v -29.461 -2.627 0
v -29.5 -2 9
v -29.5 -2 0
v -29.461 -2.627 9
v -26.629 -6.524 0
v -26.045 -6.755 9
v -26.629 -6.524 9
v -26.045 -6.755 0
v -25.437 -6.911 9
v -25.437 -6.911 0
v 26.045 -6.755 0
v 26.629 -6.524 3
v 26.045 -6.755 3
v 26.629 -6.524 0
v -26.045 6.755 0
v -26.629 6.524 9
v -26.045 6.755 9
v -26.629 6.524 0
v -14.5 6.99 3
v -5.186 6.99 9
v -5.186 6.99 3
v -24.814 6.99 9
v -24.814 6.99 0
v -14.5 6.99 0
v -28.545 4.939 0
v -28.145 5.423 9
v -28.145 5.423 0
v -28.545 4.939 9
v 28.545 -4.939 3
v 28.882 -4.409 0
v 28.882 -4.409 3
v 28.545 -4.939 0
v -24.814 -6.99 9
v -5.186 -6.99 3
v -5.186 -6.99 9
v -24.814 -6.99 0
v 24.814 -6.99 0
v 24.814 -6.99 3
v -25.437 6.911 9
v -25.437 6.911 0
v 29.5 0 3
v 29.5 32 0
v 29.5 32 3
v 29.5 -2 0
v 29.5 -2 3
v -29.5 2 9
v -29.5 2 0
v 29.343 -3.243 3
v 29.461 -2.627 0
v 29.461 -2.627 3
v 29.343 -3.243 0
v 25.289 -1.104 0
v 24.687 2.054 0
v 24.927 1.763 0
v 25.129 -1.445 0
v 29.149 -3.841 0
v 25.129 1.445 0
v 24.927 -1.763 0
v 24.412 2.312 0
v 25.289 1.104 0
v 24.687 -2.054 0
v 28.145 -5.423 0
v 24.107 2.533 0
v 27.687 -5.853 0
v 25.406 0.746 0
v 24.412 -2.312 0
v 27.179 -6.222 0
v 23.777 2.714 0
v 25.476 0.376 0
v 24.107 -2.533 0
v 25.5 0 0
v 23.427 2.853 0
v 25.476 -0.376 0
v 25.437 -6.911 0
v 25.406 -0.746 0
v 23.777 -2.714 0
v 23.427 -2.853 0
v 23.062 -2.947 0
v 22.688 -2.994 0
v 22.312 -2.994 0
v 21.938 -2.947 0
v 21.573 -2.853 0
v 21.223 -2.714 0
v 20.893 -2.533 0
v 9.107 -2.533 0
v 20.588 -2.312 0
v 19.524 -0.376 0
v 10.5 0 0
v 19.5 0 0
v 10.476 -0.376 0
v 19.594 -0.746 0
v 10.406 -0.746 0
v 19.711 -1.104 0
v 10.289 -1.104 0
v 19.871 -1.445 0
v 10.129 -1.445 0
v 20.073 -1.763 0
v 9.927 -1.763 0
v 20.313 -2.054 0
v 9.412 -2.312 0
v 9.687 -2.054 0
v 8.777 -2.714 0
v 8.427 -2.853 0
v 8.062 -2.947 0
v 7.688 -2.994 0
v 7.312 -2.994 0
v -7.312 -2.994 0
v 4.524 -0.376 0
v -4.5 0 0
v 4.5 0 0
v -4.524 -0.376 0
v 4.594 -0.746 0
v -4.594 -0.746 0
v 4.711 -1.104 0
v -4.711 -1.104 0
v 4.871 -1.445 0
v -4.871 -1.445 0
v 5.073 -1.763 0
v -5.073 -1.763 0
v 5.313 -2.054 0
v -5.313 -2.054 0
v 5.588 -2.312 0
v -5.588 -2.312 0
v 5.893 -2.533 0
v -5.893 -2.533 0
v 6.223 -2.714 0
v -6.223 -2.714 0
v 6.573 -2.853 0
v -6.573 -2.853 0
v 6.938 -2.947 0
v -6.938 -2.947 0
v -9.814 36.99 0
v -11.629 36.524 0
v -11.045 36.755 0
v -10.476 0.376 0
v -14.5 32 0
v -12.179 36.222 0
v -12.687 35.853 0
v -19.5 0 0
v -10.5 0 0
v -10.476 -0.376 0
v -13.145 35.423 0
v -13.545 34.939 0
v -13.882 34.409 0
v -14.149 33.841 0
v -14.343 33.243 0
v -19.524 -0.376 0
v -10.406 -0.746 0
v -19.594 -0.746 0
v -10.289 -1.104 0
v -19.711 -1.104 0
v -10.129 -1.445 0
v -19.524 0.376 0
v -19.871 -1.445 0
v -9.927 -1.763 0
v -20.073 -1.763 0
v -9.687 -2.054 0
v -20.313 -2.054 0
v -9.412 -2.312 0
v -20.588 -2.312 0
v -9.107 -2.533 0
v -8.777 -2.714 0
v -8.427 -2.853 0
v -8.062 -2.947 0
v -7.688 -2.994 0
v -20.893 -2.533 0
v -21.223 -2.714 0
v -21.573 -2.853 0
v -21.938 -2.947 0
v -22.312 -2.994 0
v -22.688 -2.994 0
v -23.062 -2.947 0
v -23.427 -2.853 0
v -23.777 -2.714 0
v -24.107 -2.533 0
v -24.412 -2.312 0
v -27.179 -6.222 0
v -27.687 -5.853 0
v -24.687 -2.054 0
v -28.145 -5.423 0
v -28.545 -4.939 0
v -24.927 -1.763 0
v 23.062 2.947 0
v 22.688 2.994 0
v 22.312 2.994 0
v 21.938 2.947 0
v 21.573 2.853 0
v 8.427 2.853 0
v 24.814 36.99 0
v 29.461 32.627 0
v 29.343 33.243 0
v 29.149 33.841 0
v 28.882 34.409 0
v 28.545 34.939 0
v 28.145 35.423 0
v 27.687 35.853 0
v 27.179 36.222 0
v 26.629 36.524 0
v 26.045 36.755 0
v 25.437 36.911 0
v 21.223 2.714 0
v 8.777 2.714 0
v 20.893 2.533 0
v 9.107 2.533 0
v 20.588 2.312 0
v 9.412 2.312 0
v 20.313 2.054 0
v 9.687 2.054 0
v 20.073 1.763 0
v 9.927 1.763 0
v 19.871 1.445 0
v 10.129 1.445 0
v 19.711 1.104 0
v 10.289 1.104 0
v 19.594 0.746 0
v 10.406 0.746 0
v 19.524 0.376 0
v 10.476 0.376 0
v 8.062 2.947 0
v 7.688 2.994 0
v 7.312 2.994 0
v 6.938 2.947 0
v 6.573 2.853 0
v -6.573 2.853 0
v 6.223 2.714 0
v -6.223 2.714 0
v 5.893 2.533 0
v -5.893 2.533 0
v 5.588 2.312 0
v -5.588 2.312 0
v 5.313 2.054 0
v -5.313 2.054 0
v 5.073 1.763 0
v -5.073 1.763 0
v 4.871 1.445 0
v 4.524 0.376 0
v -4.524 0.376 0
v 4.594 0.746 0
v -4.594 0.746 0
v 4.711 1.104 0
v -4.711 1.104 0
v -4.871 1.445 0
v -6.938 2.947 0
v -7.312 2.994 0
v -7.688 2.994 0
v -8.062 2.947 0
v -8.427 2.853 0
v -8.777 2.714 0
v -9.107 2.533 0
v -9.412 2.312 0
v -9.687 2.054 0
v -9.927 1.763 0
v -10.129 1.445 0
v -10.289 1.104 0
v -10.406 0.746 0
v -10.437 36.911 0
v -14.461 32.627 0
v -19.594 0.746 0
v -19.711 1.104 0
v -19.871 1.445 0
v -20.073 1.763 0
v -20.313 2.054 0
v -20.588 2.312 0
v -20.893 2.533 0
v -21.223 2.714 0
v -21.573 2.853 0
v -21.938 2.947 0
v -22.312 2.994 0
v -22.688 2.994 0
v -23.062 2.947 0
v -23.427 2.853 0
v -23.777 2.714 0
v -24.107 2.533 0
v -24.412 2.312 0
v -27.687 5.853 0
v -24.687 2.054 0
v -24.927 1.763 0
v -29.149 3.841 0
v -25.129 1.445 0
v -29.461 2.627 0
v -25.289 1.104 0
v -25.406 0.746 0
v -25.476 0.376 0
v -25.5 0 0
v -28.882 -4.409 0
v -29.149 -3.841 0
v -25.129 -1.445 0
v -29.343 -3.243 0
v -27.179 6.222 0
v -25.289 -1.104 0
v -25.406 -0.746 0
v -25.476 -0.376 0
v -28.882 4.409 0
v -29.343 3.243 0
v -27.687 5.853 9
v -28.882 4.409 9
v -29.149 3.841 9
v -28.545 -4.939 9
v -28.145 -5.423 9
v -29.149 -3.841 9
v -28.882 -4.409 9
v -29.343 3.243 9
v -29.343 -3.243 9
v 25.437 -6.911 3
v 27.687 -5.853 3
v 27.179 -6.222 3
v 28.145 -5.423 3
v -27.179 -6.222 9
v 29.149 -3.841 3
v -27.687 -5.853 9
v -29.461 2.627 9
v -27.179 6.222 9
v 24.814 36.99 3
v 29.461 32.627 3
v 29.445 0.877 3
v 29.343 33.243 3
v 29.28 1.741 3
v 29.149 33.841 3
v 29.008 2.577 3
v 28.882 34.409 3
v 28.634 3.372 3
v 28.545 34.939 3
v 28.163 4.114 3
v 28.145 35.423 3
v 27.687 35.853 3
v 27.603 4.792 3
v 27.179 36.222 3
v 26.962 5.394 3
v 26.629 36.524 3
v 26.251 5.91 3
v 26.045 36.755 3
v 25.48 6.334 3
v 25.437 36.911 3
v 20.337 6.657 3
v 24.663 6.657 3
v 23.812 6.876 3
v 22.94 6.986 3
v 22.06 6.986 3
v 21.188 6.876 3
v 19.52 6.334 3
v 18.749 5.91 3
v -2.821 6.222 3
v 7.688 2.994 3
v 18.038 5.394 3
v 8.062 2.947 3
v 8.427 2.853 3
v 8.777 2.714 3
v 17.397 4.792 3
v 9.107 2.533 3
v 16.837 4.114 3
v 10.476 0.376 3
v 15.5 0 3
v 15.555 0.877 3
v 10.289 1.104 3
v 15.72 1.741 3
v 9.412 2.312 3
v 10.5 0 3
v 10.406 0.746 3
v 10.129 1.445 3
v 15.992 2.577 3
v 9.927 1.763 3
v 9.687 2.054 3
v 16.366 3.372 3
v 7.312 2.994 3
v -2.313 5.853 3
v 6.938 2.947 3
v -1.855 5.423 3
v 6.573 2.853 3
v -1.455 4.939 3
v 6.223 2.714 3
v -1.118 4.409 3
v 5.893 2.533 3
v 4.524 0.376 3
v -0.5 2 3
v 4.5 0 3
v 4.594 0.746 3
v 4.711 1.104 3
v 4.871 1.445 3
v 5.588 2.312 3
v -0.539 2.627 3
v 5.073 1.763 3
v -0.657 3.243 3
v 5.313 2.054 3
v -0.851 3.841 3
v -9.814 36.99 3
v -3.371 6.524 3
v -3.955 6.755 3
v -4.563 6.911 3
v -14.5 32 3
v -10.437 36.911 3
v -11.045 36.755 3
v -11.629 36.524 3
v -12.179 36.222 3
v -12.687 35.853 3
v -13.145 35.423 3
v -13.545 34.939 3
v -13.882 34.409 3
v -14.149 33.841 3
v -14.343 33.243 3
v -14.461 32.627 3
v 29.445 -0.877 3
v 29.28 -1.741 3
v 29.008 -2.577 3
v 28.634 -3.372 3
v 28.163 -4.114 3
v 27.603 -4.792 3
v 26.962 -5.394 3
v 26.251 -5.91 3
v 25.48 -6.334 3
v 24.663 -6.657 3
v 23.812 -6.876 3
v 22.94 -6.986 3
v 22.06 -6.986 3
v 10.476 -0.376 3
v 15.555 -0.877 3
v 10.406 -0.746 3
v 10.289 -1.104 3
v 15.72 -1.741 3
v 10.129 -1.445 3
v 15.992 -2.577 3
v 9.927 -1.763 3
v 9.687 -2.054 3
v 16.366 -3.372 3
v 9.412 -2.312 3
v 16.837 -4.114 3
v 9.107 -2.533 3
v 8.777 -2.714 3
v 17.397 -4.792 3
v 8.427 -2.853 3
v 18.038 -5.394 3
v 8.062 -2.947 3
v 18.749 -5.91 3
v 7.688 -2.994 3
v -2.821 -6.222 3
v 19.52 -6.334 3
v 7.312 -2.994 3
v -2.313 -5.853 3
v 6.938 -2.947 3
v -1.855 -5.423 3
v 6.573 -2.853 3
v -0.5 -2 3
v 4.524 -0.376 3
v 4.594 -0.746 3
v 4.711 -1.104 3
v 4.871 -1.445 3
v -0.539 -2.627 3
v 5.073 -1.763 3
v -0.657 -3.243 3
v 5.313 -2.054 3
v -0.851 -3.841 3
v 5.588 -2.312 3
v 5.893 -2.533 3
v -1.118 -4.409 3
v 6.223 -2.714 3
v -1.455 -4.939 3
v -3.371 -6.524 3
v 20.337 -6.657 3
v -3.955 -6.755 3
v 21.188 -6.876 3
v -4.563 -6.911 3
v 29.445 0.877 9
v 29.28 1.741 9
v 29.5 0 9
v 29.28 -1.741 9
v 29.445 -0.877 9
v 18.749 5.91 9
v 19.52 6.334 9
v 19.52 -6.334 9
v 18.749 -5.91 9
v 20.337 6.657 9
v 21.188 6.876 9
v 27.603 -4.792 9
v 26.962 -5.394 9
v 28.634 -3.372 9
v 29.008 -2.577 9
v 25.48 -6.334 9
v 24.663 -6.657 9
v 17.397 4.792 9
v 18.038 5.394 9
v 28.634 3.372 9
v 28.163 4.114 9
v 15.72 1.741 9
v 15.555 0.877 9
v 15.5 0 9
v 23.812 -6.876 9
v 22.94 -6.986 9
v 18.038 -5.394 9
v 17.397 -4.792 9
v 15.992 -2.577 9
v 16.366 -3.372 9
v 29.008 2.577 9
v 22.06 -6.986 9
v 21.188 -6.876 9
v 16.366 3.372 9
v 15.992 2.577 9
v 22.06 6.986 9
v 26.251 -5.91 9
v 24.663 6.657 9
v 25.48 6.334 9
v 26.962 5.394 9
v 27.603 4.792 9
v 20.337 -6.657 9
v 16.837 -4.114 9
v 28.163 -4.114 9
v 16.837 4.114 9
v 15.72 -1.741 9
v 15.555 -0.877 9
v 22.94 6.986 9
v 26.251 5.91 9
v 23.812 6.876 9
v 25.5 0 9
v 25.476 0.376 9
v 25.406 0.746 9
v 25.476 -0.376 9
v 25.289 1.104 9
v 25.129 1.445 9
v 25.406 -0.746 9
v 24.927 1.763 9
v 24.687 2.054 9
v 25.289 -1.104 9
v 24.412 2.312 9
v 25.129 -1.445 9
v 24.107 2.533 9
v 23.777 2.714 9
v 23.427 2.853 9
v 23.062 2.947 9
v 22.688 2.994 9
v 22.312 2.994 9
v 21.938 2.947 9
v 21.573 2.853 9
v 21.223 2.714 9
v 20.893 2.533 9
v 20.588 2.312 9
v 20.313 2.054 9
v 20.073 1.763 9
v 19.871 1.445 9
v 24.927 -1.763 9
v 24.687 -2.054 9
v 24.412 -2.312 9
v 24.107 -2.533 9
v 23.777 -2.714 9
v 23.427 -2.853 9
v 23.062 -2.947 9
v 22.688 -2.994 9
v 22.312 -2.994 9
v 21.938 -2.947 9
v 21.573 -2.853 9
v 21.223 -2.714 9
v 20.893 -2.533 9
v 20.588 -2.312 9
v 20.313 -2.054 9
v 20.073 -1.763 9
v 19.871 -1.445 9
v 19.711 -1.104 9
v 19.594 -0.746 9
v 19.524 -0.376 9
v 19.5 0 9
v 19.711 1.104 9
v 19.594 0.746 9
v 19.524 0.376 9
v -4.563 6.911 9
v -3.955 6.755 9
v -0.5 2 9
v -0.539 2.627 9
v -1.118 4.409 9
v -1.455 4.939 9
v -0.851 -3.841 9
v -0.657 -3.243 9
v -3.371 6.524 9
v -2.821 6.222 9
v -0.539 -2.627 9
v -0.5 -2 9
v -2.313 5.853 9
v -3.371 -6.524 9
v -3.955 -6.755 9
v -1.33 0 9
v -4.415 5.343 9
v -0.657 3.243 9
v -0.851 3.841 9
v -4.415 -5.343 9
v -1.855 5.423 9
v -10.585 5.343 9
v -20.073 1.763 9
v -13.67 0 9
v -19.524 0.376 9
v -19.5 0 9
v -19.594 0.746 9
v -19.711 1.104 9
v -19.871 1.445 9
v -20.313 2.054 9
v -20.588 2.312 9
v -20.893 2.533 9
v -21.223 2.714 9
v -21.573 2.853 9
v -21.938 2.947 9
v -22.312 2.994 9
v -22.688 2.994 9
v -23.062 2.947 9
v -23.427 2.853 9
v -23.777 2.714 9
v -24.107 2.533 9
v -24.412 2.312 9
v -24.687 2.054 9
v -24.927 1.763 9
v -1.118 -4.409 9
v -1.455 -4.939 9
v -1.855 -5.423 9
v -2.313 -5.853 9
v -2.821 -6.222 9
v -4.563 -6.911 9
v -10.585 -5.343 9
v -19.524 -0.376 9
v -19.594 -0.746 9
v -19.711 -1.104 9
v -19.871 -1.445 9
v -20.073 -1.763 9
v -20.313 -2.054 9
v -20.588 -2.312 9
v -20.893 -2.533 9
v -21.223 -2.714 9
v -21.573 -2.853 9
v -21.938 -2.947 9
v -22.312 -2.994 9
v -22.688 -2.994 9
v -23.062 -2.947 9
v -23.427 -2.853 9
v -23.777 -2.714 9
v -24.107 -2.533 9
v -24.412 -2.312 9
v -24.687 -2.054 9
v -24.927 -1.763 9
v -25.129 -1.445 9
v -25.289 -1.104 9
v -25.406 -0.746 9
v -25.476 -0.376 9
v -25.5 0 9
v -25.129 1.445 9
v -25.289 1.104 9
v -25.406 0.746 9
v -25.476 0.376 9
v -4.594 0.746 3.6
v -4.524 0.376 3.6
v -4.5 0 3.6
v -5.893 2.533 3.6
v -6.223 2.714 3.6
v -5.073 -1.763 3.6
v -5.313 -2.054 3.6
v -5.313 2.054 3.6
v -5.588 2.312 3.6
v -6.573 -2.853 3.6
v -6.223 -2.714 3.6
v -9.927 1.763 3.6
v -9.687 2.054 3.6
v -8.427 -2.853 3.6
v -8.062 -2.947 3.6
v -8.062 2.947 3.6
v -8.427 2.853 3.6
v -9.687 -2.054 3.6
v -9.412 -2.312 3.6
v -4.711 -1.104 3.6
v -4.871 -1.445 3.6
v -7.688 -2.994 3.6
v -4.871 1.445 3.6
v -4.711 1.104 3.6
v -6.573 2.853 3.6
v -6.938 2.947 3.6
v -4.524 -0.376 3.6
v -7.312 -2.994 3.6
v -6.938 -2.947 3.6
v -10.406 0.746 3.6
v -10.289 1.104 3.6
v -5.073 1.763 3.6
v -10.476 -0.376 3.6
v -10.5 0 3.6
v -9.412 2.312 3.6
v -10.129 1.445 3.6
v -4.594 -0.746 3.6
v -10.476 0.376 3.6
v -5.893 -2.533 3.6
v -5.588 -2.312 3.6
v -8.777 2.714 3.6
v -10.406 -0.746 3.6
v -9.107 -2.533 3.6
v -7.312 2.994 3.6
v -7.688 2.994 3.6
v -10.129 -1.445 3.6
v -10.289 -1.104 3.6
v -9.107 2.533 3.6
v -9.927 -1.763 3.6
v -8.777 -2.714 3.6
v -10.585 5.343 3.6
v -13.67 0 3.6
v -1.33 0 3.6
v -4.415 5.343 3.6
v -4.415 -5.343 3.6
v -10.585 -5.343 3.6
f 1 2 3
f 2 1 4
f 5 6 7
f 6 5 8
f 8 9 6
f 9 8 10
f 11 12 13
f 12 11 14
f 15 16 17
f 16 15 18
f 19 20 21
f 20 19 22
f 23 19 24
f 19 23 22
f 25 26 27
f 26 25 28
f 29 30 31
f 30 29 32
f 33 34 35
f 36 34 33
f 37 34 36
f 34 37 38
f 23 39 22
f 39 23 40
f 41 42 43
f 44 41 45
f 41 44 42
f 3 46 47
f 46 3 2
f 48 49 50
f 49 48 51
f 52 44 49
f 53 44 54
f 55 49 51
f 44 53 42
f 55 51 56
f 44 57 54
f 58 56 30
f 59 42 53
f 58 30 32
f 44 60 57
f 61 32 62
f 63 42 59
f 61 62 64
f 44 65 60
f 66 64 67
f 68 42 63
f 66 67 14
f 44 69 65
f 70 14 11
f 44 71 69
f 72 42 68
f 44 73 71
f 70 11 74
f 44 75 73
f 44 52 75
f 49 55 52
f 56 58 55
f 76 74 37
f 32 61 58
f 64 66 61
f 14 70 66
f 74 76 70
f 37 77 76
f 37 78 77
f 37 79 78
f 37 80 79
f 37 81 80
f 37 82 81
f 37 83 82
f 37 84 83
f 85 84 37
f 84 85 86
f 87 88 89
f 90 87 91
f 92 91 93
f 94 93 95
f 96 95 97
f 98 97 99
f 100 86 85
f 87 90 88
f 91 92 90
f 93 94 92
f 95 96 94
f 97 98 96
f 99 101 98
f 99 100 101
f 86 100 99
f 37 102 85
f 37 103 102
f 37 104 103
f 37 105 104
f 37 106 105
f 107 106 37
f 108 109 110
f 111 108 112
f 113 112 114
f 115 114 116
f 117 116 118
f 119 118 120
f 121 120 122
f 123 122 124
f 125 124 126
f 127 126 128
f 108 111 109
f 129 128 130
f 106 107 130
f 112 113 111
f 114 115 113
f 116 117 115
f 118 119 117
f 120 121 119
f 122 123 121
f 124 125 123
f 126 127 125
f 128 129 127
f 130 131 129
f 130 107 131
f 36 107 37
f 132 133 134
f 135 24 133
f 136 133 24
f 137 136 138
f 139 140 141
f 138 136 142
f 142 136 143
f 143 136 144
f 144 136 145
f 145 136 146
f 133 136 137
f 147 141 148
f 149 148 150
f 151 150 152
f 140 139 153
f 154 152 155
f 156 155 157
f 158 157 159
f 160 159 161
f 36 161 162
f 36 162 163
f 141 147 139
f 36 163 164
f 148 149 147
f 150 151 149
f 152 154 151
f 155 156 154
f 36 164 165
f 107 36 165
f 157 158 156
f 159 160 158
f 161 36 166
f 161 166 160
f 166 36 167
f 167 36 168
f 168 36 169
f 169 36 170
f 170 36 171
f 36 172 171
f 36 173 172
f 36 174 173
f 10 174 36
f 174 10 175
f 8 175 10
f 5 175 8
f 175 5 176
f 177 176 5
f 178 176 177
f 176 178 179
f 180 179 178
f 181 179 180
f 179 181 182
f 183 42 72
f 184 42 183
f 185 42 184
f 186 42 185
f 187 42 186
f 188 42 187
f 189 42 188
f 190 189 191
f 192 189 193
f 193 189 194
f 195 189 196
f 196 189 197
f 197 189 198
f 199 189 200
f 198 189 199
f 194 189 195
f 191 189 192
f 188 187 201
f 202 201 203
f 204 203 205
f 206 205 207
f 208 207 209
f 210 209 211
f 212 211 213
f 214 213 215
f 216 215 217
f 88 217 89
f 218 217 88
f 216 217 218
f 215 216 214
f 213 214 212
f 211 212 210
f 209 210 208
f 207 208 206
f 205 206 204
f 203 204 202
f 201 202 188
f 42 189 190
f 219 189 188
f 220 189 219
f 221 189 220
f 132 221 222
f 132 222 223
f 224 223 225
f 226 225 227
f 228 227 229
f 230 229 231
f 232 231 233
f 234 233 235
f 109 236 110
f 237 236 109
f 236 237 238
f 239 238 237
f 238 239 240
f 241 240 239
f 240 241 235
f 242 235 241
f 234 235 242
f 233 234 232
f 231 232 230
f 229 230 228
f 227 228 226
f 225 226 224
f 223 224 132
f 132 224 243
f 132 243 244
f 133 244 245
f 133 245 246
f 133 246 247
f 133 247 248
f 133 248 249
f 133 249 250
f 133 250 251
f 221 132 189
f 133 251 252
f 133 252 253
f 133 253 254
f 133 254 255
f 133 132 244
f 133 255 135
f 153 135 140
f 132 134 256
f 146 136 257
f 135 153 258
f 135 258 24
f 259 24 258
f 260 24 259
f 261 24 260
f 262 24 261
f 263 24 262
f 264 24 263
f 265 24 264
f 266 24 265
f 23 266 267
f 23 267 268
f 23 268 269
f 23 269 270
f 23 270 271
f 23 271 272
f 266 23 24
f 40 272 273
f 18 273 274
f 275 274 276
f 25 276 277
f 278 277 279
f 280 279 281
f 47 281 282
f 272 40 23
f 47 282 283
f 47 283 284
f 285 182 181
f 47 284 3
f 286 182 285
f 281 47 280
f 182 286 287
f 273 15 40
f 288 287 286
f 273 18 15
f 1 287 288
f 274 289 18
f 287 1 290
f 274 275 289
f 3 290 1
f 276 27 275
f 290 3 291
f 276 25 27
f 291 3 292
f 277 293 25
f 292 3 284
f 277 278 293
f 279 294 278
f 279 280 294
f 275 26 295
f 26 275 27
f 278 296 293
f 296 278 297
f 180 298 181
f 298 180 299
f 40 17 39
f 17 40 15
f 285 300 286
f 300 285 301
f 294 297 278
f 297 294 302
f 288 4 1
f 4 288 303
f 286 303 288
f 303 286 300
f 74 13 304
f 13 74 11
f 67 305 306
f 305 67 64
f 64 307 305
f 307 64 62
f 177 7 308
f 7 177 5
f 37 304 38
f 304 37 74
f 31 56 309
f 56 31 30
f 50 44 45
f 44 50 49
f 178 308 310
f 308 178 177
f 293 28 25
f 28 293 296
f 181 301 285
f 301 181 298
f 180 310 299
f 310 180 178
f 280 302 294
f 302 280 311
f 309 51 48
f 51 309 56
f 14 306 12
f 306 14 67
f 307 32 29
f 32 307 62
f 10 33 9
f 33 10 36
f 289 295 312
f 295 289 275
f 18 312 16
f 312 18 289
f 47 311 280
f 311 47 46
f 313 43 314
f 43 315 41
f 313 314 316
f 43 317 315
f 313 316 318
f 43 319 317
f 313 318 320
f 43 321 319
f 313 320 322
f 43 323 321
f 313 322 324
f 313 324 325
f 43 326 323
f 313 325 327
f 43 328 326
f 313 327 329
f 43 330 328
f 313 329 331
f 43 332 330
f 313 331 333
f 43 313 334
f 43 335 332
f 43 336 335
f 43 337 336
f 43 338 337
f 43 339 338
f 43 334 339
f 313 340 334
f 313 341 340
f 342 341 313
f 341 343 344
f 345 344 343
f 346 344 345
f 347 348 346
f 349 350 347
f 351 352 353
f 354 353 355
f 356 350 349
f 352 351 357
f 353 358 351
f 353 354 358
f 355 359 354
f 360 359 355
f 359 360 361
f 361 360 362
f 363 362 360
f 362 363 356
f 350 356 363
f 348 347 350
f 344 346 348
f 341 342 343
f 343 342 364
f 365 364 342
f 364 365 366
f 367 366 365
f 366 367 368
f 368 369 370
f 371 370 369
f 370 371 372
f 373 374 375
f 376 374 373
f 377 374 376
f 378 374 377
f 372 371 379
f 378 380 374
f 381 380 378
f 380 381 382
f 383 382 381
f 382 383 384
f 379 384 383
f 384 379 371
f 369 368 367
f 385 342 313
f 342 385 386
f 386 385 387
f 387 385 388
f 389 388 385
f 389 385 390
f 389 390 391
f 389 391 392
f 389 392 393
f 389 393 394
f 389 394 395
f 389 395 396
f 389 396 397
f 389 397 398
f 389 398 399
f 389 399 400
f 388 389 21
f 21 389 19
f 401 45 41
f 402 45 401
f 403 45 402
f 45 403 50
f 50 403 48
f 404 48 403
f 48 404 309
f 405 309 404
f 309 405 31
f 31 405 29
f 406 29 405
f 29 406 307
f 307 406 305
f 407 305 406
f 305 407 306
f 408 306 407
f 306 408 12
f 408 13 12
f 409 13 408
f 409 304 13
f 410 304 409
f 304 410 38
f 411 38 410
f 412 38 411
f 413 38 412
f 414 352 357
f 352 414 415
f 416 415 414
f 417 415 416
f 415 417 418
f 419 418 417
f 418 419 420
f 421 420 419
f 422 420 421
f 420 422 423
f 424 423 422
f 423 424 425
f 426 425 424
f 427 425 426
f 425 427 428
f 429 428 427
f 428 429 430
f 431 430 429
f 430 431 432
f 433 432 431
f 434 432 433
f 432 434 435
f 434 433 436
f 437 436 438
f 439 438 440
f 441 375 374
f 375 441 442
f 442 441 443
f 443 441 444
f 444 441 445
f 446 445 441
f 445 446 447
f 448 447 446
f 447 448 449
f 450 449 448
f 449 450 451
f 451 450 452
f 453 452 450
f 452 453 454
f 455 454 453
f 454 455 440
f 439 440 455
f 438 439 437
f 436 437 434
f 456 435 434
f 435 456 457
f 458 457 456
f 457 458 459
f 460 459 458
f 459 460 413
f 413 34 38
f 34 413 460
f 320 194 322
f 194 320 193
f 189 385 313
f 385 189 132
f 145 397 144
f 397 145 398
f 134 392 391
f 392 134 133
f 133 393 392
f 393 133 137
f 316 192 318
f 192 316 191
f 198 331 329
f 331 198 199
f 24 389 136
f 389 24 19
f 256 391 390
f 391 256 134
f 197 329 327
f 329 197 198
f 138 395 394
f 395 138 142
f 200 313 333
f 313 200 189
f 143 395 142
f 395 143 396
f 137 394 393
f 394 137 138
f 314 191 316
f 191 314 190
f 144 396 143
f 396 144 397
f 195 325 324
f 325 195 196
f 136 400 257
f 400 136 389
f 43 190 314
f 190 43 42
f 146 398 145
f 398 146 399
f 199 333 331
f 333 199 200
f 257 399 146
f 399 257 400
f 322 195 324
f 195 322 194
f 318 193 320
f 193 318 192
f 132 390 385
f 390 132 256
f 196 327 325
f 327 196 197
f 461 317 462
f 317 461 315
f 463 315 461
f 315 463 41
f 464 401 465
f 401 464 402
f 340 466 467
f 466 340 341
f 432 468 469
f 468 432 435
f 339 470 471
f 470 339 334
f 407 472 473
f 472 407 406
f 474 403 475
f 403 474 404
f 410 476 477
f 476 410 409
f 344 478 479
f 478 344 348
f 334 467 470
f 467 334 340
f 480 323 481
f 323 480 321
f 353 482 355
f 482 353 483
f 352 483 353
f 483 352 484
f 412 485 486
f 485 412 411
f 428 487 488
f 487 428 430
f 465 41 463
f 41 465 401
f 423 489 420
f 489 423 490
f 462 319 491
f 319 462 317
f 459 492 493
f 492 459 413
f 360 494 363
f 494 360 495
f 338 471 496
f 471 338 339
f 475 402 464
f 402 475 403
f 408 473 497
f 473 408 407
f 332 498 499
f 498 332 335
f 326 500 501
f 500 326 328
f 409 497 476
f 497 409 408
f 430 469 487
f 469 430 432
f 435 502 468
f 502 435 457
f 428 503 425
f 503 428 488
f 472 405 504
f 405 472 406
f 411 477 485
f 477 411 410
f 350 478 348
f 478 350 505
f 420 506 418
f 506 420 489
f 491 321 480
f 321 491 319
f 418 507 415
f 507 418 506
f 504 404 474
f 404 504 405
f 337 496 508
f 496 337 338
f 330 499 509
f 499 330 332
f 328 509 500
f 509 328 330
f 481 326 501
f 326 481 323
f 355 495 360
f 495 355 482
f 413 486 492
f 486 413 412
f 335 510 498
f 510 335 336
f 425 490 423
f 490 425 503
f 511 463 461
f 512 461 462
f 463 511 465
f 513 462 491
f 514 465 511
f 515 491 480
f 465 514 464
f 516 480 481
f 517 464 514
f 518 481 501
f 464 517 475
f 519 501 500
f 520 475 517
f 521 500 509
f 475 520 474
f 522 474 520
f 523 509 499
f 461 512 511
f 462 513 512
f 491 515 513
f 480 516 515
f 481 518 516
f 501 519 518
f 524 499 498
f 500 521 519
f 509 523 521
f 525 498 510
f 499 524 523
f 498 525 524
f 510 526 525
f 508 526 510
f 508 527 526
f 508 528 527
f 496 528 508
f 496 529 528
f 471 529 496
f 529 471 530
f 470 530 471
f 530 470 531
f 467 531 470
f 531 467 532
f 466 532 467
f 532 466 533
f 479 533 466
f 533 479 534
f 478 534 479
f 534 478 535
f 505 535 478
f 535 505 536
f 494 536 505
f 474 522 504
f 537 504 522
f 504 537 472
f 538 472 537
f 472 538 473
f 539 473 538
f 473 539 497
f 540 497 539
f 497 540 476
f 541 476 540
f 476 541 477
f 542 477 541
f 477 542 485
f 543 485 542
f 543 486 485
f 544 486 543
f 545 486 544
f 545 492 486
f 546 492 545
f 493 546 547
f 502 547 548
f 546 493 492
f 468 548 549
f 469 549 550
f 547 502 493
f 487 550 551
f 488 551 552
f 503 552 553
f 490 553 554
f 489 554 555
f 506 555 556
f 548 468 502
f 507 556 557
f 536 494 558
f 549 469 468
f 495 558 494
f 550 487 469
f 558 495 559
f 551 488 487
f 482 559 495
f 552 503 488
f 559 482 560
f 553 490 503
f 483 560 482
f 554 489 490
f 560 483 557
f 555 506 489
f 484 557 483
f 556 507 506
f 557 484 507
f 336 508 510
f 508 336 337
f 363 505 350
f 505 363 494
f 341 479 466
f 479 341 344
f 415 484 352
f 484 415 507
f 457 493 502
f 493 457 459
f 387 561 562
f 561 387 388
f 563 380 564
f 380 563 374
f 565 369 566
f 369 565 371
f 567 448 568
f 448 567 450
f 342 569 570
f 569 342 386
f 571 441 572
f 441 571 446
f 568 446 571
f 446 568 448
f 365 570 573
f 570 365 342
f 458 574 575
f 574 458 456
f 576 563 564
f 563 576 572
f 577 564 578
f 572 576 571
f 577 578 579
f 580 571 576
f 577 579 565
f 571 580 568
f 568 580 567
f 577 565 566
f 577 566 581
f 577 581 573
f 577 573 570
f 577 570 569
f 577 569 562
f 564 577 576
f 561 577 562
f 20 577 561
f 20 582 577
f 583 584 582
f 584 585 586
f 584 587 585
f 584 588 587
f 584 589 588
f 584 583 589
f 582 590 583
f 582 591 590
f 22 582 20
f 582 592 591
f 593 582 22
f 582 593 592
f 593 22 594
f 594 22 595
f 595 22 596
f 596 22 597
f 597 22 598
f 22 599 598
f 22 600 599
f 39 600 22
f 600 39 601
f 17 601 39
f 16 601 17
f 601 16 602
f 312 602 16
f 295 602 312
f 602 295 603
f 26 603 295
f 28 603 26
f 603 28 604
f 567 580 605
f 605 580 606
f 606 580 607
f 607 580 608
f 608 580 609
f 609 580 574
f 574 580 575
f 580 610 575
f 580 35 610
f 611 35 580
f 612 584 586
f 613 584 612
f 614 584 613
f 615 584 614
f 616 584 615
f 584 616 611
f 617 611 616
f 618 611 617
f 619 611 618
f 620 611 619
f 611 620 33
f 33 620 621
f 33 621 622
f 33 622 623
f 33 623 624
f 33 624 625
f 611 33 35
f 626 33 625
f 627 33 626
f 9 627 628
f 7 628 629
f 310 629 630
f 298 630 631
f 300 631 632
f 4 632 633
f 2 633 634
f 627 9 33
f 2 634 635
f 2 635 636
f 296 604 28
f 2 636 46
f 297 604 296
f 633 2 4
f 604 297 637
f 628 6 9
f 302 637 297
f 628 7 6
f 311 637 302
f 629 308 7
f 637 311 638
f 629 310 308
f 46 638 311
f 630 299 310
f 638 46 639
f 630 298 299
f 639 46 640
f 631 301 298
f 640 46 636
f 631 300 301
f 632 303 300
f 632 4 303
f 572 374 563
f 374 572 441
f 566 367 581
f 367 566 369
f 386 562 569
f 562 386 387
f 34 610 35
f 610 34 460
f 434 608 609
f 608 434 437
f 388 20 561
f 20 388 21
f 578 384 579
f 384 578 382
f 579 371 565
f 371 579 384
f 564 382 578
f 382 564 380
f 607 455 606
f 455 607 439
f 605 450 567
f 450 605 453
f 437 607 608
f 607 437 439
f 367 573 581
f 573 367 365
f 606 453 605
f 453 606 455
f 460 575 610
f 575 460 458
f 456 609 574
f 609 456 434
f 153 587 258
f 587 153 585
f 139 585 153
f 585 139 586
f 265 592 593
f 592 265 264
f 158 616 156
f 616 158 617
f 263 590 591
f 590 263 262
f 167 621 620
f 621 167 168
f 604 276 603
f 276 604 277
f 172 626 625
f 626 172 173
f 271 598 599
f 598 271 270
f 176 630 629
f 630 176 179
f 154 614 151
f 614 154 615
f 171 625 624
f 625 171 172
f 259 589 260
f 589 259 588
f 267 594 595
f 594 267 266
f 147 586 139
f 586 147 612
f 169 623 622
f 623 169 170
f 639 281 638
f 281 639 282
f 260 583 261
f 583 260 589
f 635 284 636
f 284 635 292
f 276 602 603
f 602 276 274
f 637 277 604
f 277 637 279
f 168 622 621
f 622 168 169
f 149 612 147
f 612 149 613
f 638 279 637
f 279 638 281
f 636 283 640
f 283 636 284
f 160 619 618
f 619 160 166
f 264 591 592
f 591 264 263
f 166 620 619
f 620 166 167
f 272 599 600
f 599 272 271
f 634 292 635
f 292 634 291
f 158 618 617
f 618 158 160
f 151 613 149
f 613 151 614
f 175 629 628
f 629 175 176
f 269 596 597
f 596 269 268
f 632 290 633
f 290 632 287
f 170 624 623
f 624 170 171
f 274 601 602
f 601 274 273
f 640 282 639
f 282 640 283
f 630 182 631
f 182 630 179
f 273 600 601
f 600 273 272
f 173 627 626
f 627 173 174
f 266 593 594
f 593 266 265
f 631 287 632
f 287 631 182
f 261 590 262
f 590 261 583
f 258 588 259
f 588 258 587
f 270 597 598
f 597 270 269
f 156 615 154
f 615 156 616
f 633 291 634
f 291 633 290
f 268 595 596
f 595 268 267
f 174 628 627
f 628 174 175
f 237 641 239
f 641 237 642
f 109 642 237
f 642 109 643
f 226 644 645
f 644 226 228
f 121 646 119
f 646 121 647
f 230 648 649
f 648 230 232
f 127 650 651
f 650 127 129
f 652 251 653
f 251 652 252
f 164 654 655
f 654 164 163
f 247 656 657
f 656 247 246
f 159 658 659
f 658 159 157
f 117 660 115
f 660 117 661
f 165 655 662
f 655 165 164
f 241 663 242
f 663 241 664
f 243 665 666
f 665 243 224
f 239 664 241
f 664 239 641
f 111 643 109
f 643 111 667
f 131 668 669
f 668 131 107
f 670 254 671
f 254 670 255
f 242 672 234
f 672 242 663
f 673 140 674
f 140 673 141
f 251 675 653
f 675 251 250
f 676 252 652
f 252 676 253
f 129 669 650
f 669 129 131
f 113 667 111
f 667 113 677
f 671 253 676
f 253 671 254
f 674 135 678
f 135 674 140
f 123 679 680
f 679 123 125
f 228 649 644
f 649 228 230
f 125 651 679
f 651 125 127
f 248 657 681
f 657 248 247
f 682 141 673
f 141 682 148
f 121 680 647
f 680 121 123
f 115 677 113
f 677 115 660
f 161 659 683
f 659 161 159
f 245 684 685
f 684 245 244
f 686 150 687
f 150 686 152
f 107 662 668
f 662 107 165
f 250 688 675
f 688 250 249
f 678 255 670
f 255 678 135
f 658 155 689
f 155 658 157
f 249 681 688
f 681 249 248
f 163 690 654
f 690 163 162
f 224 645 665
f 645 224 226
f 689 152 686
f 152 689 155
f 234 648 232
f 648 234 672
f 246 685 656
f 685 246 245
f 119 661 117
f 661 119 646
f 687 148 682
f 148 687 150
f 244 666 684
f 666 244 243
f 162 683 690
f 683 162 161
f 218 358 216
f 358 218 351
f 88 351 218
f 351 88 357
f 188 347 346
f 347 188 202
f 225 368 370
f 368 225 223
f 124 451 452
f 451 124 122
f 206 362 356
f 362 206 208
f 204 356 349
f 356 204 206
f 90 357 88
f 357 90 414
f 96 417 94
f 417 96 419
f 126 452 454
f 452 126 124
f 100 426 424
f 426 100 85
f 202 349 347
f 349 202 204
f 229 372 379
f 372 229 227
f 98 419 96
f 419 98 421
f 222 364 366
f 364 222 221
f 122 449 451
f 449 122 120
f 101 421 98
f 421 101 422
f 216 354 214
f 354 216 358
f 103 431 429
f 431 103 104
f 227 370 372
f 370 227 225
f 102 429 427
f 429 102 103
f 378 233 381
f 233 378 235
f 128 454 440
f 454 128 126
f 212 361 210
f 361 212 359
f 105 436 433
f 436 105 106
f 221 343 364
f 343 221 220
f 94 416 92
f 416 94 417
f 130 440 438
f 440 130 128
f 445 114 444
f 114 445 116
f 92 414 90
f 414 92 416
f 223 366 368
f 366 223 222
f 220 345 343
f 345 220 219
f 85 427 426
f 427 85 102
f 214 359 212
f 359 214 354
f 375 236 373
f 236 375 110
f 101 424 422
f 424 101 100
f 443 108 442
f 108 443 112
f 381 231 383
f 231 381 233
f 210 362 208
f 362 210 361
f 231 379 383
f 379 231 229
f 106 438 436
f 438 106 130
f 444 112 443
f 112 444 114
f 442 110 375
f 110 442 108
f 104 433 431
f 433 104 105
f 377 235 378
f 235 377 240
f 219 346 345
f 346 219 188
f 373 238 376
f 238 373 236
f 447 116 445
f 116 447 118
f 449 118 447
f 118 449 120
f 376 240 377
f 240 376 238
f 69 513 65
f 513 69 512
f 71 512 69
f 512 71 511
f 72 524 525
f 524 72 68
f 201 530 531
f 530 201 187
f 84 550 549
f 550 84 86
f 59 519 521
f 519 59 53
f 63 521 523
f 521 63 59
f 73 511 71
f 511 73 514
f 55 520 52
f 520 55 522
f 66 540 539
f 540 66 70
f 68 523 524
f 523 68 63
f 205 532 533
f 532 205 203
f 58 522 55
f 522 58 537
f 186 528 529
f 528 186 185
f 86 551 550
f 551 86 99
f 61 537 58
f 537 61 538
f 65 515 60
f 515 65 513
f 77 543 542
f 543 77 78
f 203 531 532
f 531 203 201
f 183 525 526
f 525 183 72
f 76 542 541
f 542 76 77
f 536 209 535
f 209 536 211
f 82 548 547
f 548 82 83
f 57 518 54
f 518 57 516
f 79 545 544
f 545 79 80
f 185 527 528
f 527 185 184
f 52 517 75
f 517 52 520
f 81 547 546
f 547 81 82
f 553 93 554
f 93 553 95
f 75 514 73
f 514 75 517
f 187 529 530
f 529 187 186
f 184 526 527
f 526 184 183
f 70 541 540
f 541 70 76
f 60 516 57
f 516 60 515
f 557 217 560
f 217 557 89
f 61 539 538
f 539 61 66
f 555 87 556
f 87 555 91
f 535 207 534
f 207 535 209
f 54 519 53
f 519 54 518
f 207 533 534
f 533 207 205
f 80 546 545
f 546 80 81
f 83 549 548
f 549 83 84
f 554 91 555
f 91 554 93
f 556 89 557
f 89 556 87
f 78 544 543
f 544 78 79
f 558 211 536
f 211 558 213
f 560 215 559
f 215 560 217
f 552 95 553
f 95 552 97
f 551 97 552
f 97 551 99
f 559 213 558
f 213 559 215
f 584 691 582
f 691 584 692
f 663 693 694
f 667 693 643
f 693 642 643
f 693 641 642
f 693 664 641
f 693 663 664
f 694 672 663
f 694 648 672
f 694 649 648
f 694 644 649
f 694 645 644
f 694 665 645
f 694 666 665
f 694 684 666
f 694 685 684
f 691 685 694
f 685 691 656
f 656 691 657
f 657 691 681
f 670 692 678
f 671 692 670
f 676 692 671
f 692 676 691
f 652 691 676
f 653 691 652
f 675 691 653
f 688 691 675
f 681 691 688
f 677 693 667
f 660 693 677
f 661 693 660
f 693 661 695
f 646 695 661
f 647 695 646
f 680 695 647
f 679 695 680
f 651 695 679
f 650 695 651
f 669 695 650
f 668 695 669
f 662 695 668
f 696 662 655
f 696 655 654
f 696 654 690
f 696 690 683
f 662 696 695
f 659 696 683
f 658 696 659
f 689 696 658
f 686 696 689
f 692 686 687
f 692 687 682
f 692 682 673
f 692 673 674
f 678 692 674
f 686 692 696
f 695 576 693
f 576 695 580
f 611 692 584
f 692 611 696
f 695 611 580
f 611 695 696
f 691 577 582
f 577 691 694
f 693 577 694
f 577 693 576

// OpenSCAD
$fn = 50;


difference() {
	union() {
		translate(v = [0, 0, 0]) {
			rotate(a = [0, 0, 0]) {
				hull() {
					translate(v = [-24.5000000000, 2.0000000000, 0]) {
						rotate(a = [0, 0, 0]) {
							translate(v = [0, 0, 0]) {
								rotate(a = [0, 0, 0]) {
									cylinder(h = 3, r = 5);
								}
							}
						}
					}
					translate(v = [24.5000000000, 2.0000000000, 0]) {
						rotate(a = [0, 0, 0]) {
							translate(v = [0, 0, 0]) {
								rotate(a = [0, 0, 0]) {
									cylinder(h = 3, r = 5);
								}
							}
						}
					}
					translate(v = [-24.5000000000, -2.0000000000, 0]) {
						rotate(a = [0, 0, 0]) {
							translate(v = [0, 0, 0]) {
								rotate(a = [0, 0, 0]) {
									cylinder(h = 3, r = 5);
								}
							}
						}
					}
					translate(v = [24.5000000000, -2.0000000000, 0]) {
						rotate(a = [0, 0, 0]) {
							translate(v = [0, 0, 0]) {
								rotate(a = [0, 0, 0]) {
									cylinder(h = 3, r = 5);
								}
							}
						}
					}
				}
			}
		}
		translate(v = [7.5000000000, 15.0000000000, 0]) {
			rotate(a = [0, 0, 0]) {
				hull() {
					translate(v = [-17.0000000000, 17.0000000000, 0]) {
						rotate(a = [0, 0, 0]) {
							translate(v = [0, 0, 0]) {
								rotate(a = [0, 0, 0]) {
									cylinder(h = 3, r = 5);
								}
							}
						}
					}
					translate(v = [17.0000000000, 17.0000000000, 0]) {
						rotate(a = [0, 0, 0]) {
							translate(v = [0, 0, 0]) {
								rotate(a = [0, 0, 0]) {
									cylinder(h = 3, r = 5);
								}
							}
						}
					}
					translate(v = [-17.0000000000, -17.0000000000, 0]) {
						rotate(a = [0, 0, 0]) {
							translate(v = [0, 0, 0]) {
								rotate(a = [0, 0, 0]) {
									cylinder(h = 3, r = 5);
								}
							}
						}
					}
					translate(v = [17.0000000000, -17.0000000000, 0]) {
						rotate(a = [0, 0, 0]) {
							translate(v = [0, 0, 0]) {
								rotate(a = [0, 0, 0]) {
									cylinder(h = 3, r = 5);
								}
							}
						}
					}
				}
			}
		}
		translate(v = [22.5000000000, 0, 0]) {
			rotate(a = [0, 0, 0]) {
				cylinder(h = 9, r = 7.0000000000);
			}
		}
		translate(v = [-15.0000000000, 0, 0]) {
			rotate(a = [0, 0, 0]) {
				hull() {
					translate(v = [-9.5000000000, 2.0000000000, 0]) {
						rotate(a = [0, 0, 0]) {
							translate(v = [0, 0, 0]) {
								rotate(a = [0, 0, 0]) {
									cylinder(h = 9, r = 5);
								}
							}
						}
					}
					translate(v = [9.5000000000, 2.0000000000, 0]) {
						rotate(a = [0, 0, 0]) {
							translate(v = [0, 0, 0]) {
								rotate(a = [0, 0, 0]) {
									cylinder(h = 9, r = 5);
								}
							}
						}
					}
					translate(v = [-9.5000000000, -2.0000000000, 0]) {
						rotate(a = [0, 0, 0]) {
							translate(v = [0, 0, 0]) {
								rotate(a = [0, 0, 0]) {
									cylinder(h = 9, r = 5);
								}
							}
						}
					}
					translate(v = [9.5000000000, -2.0000000000, 0]) {
						rotate(a = [0, 0, 0]) {
							translate(v = [0, 0, 0]) {
								rotate(a = [0, 0, 0]) {
									cylinder(h = 9, r = 5);
								}
							}
						}
					}
				}
			}
		}
	}
	union() {
		translate(v = [-22.5000000000, 0.0000000000, 0]) {
			rotate(a = [0, 0, 0]) {
				translate(v = [0, 0, -50]) {
					rotate(a = [0, 0, 0]) {
						cylinder(h = 100, r = 3.0000000000);
					}
				}
			}
		}
		translate(v = [-7.5000000000, 0.0000000000, 0]) {
			rotate(a = [0, 0, 0]) {
				translate(v = [0, 0, -50]) {
					rotate(a = [0, 0, 0]) {
						cylinder(h = 100, r = 3.0000000000);
					}
				}
			}
		}
		translate(v = [7.5000000000, 0.0000000000, 0]) {
			rotate(a = [0, 0, 0]) {
				translate(v = [0, 0, -50]) {
					rotate(a = [0, 0, 0]) {
						cylinder(h = 100, r = 3.0000000000);
					}
				}
			}
		}
		translate(v = [22.5000000000, 0.0000000000, 0]) {
			rotate(a = [0, 0, 0]) {
				translate(v = [0, 0, -50]) {
					rotate(a = [0, 0, 0]) {
						cylinder(h = 100, r = 3.0000000000);
					}
				}
			}
		}
		translate(v = [-7.5000000000, 0, 3.6000000000]) {
			rotate(a = [0, 0, 0]) {
				translate(v = [0, 0, 0]) {
					rotate(a = [0, 0, 0]) {
						linear_extrude(height = 5.4000000000) {
							polygon(points = [[6.1700000000, 0.0000000000], [3.0850000000, 5.3433767413], [-3.0850000000, 5.3433767413], [-6.1700000000, 0.0000000000], [-3.0850000000, -5.3433767413], [3.0850000000, -5.3433767413]]);
						}
					}
				}
			}
		}
	}
}
